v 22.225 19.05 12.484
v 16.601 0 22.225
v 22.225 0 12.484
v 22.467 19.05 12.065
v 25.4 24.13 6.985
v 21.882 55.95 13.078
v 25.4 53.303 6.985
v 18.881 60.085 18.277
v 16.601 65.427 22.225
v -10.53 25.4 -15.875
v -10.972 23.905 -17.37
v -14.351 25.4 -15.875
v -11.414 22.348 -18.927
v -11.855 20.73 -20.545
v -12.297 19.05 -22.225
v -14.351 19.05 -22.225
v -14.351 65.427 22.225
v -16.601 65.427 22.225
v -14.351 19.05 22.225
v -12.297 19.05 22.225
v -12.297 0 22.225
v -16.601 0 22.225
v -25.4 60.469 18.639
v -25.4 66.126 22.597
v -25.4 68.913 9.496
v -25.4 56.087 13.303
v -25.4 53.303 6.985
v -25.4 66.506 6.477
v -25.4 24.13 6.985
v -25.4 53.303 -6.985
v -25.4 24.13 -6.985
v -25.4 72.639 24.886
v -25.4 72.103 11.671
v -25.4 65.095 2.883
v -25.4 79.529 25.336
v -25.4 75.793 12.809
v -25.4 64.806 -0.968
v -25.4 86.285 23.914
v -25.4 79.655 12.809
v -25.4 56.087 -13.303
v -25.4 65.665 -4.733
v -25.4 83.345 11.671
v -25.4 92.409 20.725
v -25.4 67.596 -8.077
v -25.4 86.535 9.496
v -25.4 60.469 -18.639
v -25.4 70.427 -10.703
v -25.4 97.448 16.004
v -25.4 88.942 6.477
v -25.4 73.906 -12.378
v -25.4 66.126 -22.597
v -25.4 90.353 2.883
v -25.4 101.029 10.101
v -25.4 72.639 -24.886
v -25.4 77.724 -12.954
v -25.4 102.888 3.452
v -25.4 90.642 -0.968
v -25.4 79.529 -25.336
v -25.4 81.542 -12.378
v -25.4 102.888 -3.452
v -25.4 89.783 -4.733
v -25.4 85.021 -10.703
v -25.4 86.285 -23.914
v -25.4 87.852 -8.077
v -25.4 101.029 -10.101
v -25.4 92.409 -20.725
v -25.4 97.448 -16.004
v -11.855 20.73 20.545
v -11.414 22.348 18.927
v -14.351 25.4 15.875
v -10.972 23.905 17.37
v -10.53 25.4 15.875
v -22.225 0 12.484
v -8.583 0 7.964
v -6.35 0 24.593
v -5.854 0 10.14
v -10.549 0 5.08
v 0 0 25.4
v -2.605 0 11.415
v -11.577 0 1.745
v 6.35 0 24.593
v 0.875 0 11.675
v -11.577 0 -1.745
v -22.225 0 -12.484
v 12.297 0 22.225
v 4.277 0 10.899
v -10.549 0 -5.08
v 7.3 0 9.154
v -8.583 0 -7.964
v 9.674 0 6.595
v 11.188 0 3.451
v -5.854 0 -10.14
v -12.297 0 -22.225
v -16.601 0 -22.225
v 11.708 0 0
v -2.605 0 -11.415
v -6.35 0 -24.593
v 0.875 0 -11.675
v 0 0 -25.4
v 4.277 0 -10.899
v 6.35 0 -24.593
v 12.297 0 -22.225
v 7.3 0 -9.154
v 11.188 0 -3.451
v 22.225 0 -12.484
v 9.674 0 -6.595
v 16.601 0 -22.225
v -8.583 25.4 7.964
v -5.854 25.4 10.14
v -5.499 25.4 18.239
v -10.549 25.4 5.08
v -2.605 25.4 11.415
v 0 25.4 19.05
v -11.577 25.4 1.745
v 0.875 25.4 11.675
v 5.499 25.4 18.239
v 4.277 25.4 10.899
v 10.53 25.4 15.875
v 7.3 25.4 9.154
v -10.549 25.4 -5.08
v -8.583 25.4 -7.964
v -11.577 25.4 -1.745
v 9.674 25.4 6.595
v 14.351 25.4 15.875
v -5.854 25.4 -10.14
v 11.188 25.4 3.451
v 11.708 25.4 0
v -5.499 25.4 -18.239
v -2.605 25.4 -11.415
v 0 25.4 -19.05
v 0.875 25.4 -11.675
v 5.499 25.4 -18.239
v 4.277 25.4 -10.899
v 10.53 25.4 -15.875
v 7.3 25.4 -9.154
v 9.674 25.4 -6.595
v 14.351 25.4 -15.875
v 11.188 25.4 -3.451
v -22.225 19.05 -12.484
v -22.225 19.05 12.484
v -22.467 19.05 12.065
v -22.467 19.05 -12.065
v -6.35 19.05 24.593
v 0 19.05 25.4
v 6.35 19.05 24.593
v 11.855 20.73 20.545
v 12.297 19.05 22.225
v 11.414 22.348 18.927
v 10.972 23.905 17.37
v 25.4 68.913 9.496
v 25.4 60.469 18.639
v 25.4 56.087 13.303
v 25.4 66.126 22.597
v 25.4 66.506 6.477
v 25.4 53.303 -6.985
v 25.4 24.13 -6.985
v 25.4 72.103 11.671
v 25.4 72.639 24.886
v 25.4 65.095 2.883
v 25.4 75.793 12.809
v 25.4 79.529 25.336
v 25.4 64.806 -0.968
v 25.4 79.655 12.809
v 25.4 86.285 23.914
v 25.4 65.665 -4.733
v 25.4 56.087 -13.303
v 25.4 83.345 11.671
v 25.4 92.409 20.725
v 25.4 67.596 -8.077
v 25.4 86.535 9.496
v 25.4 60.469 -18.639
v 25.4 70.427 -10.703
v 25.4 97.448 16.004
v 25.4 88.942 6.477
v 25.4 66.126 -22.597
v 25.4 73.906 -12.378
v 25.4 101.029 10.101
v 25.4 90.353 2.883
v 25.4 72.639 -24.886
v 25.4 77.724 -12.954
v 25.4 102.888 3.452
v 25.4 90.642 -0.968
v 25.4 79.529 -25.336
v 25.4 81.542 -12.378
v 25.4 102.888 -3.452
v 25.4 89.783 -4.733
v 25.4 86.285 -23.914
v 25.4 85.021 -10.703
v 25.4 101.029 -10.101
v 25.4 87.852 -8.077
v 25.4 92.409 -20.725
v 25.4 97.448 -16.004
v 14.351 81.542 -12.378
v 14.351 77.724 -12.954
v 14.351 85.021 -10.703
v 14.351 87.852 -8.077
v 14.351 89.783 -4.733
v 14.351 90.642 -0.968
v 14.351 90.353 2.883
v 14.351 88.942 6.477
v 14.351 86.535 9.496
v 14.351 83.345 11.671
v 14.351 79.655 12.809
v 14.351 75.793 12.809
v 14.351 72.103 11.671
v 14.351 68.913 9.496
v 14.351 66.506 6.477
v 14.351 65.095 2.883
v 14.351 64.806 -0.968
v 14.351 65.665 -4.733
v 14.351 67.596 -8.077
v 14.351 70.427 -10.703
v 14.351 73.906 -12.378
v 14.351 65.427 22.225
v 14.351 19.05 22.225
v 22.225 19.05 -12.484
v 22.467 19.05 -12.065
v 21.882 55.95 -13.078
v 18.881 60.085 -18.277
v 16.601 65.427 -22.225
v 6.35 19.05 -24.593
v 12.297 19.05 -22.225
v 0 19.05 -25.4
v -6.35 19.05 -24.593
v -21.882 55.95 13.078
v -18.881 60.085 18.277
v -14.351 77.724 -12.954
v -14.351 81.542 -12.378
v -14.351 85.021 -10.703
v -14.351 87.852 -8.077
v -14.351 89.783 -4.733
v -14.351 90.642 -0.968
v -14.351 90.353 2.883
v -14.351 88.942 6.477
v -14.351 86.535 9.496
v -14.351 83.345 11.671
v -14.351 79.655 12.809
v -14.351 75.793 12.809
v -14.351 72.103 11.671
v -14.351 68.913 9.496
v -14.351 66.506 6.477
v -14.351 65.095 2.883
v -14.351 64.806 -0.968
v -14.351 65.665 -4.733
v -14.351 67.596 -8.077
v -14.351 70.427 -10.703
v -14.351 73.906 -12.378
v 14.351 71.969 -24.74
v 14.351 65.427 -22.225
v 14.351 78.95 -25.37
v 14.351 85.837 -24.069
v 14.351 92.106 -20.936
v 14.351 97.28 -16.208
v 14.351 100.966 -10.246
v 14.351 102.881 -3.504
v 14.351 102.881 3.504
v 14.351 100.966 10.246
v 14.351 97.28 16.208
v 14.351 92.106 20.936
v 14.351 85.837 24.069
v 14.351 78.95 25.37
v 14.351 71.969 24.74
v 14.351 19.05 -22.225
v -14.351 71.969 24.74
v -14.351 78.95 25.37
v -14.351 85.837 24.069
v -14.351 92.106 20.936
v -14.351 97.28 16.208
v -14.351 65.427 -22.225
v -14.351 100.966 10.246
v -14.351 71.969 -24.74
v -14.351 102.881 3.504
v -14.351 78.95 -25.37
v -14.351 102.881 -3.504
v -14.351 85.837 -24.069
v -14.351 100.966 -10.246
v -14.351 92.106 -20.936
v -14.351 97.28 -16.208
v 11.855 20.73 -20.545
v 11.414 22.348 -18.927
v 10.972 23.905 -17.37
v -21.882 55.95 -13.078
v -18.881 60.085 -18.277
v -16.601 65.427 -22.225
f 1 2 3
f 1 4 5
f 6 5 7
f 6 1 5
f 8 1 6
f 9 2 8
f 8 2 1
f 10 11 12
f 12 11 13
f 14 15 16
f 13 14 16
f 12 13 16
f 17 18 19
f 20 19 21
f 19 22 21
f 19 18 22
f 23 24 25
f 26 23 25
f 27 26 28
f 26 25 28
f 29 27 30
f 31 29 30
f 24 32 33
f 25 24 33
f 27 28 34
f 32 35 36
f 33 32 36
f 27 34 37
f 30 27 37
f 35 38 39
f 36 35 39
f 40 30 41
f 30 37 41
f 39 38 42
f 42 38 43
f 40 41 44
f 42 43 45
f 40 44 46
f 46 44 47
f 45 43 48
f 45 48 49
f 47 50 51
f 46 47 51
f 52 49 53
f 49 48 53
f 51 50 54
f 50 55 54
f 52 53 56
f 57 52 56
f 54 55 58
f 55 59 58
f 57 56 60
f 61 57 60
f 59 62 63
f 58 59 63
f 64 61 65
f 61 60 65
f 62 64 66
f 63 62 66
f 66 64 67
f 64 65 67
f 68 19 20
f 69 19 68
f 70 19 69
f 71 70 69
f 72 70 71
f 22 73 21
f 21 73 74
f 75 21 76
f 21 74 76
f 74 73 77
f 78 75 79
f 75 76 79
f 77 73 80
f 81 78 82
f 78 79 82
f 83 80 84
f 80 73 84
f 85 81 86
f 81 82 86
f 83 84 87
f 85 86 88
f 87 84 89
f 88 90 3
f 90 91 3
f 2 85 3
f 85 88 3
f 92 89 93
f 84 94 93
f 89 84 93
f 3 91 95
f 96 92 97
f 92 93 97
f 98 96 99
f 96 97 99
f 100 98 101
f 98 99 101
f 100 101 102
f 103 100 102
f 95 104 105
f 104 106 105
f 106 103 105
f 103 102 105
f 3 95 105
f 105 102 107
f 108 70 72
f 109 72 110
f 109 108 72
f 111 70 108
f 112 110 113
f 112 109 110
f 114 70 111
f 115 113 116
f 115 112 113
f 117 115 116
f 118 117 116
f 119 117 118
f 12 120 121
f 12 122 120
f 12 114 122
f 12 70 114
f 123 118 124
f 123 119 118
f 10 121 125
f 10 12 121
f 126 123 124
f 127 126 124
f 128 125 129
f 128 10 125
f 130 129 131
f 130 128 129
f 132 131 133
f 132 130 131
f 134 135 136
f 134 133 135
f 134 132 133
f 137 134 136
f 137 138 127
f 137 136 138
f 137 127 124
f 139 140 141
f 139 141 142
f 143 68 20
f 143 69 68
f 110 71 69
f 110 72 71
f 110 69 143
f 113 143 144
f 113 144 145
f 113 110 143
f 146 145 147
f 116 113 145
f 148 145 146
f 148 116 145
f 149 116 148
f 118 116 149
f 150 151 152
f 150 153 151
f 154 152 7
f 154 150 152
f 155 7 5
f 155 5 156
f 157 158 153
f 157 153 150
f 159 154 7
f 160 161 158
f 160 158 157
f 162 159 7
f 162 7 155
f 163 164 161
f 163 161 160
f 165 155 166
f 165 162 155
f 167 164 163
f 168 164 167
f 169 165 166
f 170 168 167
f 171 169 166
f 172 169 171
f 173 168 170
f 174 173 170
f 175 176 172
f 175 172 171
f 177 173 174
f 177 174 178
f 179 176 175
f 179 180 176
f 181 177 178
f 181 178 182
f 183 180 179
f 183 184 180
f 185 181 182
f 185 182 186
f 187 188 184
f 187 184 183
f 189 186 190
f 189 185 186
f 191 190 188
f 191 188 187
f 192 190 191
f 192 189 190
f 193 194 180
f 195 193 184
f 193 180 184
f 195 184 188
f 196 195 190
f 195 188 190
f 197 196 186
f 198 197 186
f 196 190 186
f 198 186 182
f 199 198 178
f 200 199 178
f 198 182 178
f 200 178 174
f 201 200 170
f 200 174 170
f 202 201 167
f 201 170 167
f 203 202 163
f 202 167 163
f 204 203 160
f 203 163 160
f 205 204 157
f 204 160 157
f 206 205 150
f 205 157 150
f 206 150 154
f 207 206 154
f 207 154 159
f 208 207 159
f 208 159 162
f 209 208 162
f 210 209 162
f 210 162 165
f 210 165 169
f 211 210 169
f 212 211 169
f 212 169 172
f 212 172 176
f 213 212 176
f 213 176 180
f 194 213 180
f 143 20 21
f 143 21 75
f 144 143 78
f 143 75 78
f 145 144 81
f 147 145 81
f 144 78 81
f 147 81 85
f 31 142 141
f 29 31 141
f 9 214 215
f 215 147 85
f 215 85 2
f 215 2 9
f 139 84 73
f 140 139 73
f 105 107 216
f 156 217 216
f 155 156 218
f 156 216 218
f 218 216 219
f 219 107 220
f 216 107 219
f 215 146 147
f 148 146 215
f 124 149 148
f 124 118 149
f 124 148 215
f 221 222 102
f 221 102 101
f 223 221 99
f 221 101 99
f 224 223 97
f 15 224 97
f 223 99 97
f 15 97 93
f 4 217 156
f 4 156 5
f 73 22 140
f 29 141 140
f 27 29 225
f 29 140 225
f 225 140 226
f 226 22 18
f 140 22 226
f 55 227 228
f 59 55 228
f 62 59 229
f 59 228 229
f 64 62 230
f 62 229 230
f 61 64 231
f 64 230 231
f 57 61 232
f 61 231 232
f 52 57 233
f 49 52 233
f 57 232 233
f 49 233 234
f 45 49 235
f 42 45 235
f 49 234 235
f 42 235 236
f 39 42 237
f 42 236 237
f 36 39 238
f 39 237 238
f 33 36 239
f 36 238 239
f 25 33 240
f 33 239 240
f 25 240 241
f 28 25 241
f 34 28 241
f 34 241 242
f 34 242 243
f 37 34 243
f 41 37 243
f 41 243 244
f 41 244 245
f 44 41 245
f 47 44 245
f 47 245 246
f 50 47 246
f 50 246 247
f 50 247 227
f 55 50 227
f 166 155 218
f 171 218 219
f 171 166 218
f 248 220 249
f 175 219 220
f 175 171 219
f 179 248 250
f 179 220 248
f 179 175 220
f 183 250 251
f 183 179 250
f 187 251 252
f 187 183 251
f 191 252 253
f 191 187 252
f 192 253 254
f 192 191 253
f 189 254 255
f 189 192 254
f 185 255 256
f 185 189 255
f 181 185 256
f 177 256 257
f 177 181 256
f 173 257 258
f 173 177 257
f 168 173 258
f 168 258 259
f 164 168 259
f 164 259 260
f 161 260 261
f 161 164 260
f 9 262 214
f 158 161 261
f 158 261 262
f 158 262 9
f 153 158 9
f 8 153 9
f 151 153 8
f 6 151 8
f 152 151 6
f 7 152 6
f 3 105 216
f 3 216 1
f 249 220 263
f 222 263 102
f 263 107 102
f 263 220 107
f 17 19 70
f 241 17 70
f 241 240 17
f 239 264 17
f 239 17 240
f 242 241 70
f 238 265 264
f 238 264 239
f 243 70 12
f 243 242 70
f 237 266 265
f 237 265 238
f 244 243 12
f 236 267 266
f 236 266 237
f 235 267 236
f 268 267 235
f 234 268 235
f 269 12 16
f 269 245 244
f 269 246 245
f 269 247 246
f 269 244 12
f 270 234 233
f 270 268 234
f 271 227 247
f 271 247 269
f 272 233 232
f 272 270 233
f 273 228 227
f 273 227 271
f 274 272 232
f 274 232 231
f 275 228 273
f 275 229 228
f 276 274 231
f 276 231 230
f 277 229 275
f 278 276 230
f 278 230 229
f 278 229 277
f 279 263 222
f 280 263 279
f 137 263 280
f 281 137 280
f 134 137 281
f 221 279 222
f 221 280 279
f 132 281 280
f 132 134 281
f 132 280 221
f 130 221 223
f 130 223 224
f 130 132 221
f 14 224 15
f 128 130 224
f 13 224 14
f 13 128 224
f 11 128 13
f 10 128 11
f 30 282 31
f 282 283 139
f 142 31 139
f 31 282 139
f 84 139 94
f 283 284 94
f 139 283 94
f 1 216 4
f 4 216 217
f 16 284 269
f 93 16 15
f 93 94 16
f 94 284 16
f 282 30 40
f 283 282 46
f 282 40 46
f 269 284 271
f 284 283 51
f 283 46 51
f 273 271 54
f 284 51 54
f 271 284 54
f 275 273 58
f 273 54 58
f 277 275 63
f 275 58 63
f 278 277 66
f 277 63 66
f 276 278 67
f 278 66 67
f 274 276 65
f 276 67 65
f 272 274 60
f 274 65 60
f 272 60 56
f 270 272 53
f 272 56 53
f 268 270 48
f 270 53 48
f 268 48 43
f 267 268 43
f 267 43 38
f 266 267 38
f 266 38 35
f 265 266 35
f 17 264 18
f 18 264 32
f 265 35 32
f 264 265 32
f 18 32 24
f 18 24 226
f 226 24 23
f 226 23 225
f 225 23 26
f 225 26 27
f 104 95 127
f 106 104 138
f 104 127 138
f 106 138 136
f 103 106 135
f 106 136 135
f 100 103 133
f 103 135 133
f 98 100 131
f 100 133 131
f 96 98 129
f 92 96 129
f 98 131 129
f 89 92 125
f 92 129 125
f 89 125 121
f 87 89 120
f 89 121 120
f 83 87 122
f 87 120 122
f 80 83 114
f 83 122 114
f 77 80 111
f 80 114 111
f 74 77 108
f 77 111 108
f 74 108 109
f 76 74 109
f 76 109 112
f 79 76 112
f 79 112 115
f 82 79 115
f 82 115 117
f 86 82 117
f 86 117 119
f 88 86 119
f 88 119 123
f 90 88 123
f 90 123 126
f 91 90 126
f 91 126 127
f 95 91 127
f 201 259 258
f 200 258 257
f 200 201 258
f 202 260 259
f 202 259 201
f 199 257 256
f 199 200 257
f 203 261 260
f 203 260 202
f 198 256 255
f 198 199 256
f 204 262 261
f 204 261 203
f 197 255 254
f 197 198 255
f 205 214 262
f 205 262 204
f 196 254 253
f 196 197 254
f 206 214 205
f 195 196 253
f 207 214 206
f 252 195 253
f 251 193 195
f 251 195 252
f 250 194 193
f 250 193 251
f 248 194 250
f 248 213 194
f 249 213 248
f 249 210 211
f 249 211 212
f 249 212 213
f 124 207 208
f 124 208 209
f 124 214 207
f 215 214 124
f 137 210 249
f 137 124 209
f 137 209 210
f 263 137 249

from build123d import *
from OCP.BRepFilletAPI import BRepFilletAPI_MakeChamfer

# Parameters (mm, degrees)
BOSS_EXTRUDE1_DEPTH   = 25.4
SKETCH2_W             = 11.049
SKETCH2_H             = 44.45
BOSS_EXTRUDE2_DEPTH   = 52.324
CHAMFER1_SIZE         = 6.35
F_1_12_TAPPED_HOLE1_D = 23.41626
CHAMFER2_SIZE         = 15.24
CHAMFER2_SIZE2        = 8.798818102
SKETCH5_W             = 31.303655522
SKETCH5_H             = 45.499968027
CUT_EXTRUDE1_DEPTH    = 19.05
BOSS_EXTRUDE3_REACH   = 98.264
SKETCH6_R             = 25.4
BOSS_EXTRUDE4_START   = -50.8
SKETCH6_2_R           = 25.4
BOSS_EXTRUDE4_DEPTH   = 11.049
SKETCH7_R             = 12.954
CUT_EXTRUDE2_DEPTH    = 118.730027504
CHAMFER4_SIZE         = 5.08
CHAMFER4_SIZE2        = 2.932939367


with BuildPart() as part:
    # Sketch1 → Boss-Extrude1 (new body)
    with BuildSketch(Plane(origin=(0, 0, 0), x_dir=(1, 0, 0), z_dir=(0, 1, 0))):
        with BuildLine():
            Line((-25.4, -22.225), (-12.296722124, -22.225))
            ThreePointArc((-12.296722124, -22.225), (0, -25.4), (12.296722124, -22.225))
            Line((12.296722124, -22.225), (25.4, -22.225))
            Line((25.4, -22.225), (25.4, 22.225))
            Line((25.4, 22.225), (12.296722124, 22.225))
            ThreePointArc((12.296722124, 22.225), (0, 25.4), (-12.296722124, 22.225))
            Line((-12.296722124, 22.225), (-25.4, 22.225))
            Line((-25.4, 22.225), (-25.4, -22.225))
        make_face()
    extrude(amount=BOSS_EXTRUDE1_DEPTH)

    # Sketch2 → Boss-Extrude2 (add)
    with BuildSketch(Plane(origin=(0, 25.4, 0), x_dir=(1, 0, 0), z_dir=(0, 1, 0))):
        with Locations((-19.8755, 0)):
            Rectangle(SKETCH2_W, SKETCH2_H)
        with Locations((19.8755, 0)):
            Rectangle(SKETCH2_W, SKETCH2_H)
    extrude(amount=BOSS_EXTRUDE2_DEPTH)

    # Chamfer1
    chamfer1_edges = [part.edges().sort_by_distance(p)[0] for p in [
        (0, 25.4, 25.4),
        (13.323861062, 25.4, 22.225),
        (-13.323861062, 25.4, 22.225),
        (13.323861062, 25.4, -22.225),
        (0, 25.4, -25.4),
        (-13.323861062, 25.4, -22.225),
    ]]
    chamfer(chamfer1_edges, length=CHAMFER1_SIZE)

    # 1-12 Tapped Hole1 (through all)
    with Locations(Plane(origin=(0, 0, 0), x_dir=(-1, 0, 0), z_dir=(0, -1, 0))):
        with Locations((0, 0)):
            Hole(F_1_12_TAPPED_HOLE1_D / 2)

    # Chamfer2: one chamfer whose edges measure the first distance from different faces: ONE call of the kernel's chamfer builder (chamfer() names one face for all edges)
    chamfer2_edges_1 = [part.edges().sort_by_distance(p)[0] for p in [
        (25.4, 38.862, -22.225),
        (25.4, 38.862, 22.225),
    ]]
    chamfer2_side_1 = [part.faces().sort_by_distance(p)[0] for p in [
        (25.4, 38.862, 0),
    ]]
    chamfer2_edges_2 = [part.edges().sort_by_distance(p)[0] for p in [
        (-25.4, 38.862, 22.225),
        (-25.4, 38.862, -22.225),
    ]]
    chamfer2_side_2 = [part.faces().sort_by_distance(p)[0] for p in [
        (-25.4, 38.862, 0),
    ]]
    chamfer2 = BRepFilletAPI_MakeChamfer(part.part.solid().wrapped)
    for e in chamfer2_edges_1:
        chamfer2.Add(CHAMFER2_SIZE, CHAMFER2_SIZE2, e.wrapped, chamfer2_side_1[0].wrapped)  # the first distance lies on this face
    for e in chamfer2_edges_2:
        chamfer2.Add(CHAMFER2_SIZE, CHAMFER2_SIZE2, e.wrapped, chamfer2_side_2[0].wrapped)  # the first distance lies on this face
    add(Compound.cast(chamfer2.Shape()), mode=Mode.REPLACE)

    # Sketch5 → Cut-Extrude1 (cut)
    with BuildSketch(Plane.XZ):
        with Locations((-37.876827761, -1.94234058)):
            Rectangle(SKETCH5_W, SKETCH5_H)
        with Locations((37.876827761, -1.94234058)):
            Rectangle(SKETCH5_W, SKETCH5_H)
    extrude(amount=-CUT_EXTRUDE1_DEPTH, mode=Mode.SUBTRACT)

    # Boss-Extrude3: up to this face of the body (flat: up to its plane)
    boss_extrude3_end = Plane(part.part.faces().sort_by_distance((14.351, 51.080086798, 0))[0])
    # Sketch6 → Boss-Extrude3 (add, up to the picked face)
    with BuildSketch(Plane(origin=(25.4, 0, 0), x_dir=(0, 0, -1), z_dir=(1, 0, 0)), mode=Mode.PRIVATE) as boss_extrude3_sk1:
        with Locations((0, 77.724)):
            Circle(SKETCH6_R)
    boss_extrude3_tool1 = split(extrude(boss_extrude3_sk1.sketch, amount=-BOSS_EXTRUDE3_REACH, mode=Mode.PRIVATE), bisect_by=boss_extrude3_end, keep=Keep.BOTH, mode=Mode.PRIVATE)
    add(boss_extrude3_tool1.solids().sort_by(Axis((25.4, 77.724, 0), (-1, 0, 0)))[0])

    # Sketch6<2> → Boss-Extrude4 (add)
    with BuildSketch(Plane(origin=(25.4, 0, 0), x_dir=(0, 0, -1), z_dir=(1, 0, 0)).offset(BOSS_EXTRUDE4_START)):
        with Locations((0, 77.724)):
            Circle(SKETCH6_2_R)
    extrude(amount=BOSS_EXTRUDE4_DEPTH)

    # Sketch7 → Cut-Extrude2 (cut, through all)
    with BuildSketch(Plane(origin=(25.4, 0, 0), x_dir=(0, 0, -1), z_dir=(1, 0, 0))):
        with Locations((0, 77.724)):
            Circle(SKETCH7_R)
    extrude(amount=-CUT_EXTRUDE2_DEPTH, mode=Mode.SUBTRACT)

    # Chamfer4: one chamfer whose edges measure the first distance from different faces: ONE call of the kernel's chamfer builder (chamfer() names one face for all edges)
    chamfer4_edges_1 = [part.edges().sort_by_distance(p)[0] for p in [
        (-25.4, 19.05, 0),
    ]]
    chamfer4_side_1 = [part.faces().sort_by_distance(p)[0] for p in [
        (-25.4, 36.176658328, -6.002702821),
    ]]
    chamfer4_edges_2 = [part.edges().sort_by_distance(p)[0] for p in [
        (25.4, 19.05, 0),
    ]]
    chamfer4_side_2 = [part.faces().sort_by_distance(p)[0] for p in [
        (25.4, 102.141702821, 0),
    ]]
    chamfer4 = BRepFilletAPI_MakeChamfer(part.part.solid().wrapped)
    for e in chamfer4_edges_1:
        chamfer4.Add(CHAMFER4_SIZE, CHAMFER4_SIZE2, e.wrapped, chamfer4_side_1[0].wrapped)  # the first distance lies on this face
    for e in chamfer4_edges_2:
        chamfer4.Add(CHAMFER4_SIZE, CHAMFER4_SIZE2, e.wrapped, chamfer4_side_2[0].wrapped)  # the first distance lies on this face
    add(Compound.cast(chamfer4.Shape()), mode=Mode.REPLACE)


solid = part.part
